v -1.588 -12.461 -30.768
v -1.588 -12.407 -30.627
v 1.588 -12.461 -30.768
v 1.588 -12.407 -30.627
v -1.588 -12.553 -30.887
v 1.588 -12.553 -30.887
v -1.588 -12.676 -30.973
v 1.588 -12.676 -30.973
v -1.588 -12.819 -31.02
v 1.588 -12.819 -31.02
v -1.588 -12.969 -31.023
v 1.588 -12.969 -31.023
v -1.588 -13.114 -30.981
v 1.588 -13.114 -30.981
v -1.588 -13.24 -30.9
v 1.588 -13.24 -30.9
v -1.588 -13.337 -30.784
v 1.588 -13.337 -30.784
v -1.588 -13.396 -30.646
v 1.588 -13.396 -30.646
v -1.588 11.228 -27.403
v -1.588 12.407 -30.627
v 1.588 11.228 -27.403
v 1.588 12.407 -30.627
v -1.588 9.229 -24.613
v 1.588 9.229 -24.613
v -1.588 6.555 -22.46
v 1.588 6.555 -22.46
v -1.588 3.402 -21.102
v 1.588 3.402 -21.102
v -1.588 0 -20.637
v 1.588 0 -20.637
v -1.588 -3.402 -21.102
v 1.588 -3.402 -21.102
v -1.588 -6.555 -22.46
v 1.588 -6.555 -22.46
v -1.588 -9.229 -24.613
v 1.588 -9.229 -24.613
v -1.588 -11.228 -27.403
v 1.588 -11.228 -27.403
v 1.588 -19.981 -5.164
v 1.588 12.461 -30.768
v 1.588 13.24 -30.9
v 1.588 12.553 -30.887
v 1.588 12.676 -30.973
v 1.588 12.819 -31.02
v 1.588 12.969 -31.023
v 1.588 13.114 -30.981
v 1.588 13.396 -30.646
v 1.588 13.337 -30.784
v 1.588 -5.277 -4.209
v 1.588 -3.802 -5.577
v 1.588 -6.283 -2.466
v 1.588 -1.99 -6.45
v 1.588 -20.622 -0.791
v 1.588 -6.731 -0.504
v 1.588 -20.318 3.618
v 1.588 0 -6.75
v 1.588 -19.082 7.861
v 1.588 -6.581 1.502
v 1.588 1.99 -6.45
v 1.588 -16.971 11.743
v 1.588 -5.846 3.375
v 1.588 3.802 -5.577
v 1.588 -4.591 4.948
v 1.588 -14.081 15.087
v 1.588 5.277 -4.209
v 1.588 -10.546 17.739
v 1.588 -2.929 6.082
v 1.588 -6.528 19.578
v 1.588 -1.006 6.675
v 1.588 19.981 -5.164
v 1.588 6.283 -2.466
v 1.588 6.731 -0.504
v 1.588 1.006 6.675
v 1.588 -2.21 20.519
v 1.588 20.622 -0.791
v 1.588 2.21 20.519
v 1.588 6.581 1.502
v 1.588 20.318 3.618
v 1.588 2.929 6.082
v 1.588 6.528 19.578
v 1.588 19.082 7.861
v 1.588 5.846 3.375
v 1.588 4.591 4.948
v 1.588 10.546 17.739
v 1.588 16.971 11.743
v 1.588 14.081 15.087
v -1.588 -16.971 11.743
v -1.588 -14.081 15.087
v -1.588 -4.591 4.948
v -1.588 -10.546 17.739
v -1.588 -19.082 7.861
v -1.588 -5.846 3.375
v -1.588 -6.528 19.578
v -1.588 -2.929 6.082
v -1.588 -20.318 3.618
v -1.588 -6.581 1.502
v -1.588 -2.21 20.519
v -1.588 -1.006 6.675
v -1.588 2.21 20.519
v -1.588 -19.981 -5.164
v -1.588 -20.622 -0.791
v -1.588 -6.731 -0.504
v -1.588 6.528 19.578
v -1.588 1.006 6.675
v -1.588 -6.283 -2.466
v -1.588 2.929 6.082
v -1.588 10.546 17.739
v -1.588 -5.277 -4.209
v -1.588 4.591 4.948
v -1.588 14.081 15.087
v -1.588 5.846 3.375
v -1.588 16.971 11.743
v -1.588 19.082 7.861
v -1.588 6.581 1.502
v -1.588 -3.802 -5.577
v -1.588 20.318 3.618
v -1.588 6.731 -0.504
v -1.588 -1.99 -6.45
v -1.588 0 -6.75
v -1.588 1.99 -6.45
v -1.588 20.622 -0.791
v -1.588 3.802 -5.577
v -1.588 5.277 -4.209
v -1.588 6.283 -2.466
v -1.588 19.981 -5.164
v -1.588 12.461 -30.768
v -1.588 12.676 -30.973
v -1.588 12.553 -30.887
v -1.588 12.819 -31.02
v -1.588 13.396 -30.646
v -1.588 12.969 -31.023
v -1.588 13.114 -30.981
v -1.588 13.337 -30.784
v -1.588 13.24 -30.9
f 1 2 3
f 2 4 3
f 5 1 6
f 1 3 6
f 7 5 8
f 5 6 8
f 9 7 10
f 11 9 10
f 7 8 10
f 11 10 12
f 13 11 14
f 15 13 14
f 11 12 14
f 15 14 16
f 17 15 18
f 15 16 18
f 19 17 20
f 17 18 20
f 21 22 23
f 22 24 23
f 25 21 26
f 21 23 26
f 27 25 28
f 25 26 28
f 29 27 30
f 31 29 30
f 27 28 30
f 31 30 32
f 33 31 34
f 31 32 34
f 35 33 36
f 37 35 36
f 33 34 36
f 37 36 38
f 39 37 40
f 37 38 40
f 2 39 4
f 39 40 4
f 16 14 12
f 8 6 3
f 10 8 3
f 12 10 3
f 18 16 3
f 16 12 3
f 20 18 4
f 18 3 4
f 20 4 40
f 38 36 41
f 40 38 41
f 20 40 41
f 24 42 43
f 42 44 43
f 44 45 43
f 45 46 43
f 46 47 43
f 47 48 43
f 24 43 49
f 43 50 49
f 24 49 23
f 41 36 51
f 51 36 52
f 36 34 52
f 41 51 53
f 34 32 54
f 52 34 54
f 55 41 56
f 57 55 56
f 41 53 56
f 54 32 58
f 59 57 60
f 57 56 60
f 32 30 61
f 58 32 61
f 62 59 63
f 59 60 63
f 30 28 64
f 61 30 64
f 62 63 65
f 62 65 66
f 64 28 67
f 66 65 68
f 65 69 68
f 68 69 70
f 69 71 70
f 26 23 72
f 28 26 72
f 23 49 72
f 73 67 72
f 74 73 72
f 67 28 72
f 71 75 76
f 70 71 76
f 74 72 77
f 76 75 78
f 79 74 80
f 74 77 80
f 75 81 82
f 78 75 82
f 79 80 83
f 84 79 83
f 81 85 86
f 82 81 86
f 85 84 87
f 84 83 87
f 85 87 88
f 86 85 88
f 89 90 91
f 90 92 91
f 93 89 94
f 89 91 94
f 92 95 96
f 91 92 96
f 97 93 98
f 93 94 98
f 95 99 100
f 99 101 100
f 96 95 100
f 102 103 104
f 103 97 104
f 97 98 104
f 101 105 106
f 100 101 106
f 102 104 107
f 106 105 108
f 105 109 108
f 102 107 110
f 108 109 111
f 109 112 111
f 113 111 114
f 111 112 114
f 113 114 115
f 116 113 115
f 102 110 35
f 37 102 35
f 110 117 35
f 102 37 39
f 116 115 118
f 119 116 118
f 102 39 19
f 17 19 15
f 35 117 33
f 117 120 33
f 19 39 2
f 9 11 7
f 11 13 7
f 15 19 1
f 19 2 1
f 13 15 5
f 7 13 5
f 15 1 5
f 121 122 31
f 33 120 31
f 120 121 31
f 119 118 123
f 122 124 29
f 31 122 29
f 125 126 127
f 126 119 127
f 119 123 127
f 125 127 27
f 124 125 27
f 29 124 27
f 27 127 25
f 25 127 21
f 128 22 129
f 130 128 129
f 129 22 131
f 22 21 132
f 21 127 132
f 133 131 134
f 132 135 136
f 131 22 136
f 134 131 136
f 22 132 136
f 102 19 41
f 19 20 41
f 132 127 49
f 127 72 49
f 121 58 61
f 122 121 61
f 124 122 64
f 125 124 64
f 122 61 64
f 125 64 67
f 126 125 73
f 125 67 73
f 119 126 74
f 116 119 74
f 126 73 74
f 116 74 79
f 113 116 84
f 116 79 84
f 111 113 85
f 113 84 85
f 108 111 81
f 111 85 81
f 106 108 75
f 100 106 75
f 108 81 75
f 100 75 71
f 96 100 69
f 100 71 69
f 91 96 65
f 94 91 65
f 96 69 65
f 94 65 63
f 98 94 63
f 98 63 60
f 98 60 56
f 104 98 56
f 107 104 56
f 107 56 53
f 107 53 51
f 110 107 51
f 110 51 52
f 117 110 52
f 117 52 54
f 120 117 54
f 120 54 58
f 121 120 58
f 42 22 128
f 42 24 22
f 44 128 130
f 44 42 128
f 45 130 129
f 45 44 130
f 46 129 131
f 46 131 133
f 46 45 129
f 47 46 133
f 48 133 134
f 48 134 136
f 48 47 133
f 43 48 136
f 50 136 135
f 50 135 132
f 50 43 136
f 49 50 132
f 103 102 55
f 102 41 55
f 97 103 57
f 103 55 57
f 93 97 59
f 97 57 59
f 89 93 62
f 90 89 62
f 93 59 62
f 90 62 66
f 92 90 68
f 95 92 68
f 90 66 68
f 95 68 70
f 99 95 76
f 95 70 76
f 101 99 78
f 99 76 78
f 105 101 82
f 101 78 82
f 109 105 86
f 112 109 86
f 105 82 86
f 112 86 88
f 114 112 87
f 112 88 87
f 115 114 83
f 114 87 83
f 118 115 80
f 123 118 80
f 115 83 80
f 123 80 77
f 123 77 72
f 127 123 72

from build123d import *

# Parameters (mm, degrees)
SKETCH1_R             = 6.749999962
BOSS_EXTRUDE1_DEPTH   = 1.5875
FILLET1_R             = 0.508
FILLET2_R             = 0.508
M12_CLEARANCE_HOLE1_D = 13.5


with BuildPart() as part:
    # Sketch1 → Boss-Extrude1 (new, symmetric)
    # profile 1 of 2: a face of its own
    with BuildSketch(Plane(origin=(0, 0, 0), x_dir=(0, 0, -1), z_dir=(1, 0, 0))):
        with BuildLine():
            Line((33.3375, -12.7), (5.163771309, -19.981037814))
            ThreePointArc((5.163771309, -19.981037814), (-20.6375, 0), (5.163771309, 19.981037814))
            Line((5.163771309, 19.981037814), (33.3375, 12.7))
            ThreePointArc((33.3375, 12.7), (20.6375, 0), (33.3375, -12.7))
        make_face()
        Circle(SKETCH1_R, mode=Mode.SUBTRACT)
    # profile 2 of 2: a face of its own
    with BuildSketch(Plane(origin=(0, 0, 0), x_dir=(0, 0, -1), z_dir=(1, 0, 0))):
        Circle(SKETCH1_R)
    extrude(amount=BOSS_EXTRUDE1_DEPTH, both=True)

    # Fillet1
    fillet1_edges = [part.edges().sort_by_distance(p)[0] for p in [
        (0, -12.7, -33.3375),
    ]]
    fillet(fillet1_edges, radius=FILLET1_R)

    # Fillet2
    fillet2_edges = [part.edges().sort_by_distance(p)[0] for p in [
        (0, 12.7, -33.3375),
    ]]
    fillet(fillet2_edges, radius=FILLET2_R)

    # M12 Clearance Hole1 (through all)
    with Locations(Plane.ZY.offset(1.5875)):
        with Locations((0, 0)):
            Hole(M12_CLEARANCE_HOLE1_D / 2)


solid = part.part
